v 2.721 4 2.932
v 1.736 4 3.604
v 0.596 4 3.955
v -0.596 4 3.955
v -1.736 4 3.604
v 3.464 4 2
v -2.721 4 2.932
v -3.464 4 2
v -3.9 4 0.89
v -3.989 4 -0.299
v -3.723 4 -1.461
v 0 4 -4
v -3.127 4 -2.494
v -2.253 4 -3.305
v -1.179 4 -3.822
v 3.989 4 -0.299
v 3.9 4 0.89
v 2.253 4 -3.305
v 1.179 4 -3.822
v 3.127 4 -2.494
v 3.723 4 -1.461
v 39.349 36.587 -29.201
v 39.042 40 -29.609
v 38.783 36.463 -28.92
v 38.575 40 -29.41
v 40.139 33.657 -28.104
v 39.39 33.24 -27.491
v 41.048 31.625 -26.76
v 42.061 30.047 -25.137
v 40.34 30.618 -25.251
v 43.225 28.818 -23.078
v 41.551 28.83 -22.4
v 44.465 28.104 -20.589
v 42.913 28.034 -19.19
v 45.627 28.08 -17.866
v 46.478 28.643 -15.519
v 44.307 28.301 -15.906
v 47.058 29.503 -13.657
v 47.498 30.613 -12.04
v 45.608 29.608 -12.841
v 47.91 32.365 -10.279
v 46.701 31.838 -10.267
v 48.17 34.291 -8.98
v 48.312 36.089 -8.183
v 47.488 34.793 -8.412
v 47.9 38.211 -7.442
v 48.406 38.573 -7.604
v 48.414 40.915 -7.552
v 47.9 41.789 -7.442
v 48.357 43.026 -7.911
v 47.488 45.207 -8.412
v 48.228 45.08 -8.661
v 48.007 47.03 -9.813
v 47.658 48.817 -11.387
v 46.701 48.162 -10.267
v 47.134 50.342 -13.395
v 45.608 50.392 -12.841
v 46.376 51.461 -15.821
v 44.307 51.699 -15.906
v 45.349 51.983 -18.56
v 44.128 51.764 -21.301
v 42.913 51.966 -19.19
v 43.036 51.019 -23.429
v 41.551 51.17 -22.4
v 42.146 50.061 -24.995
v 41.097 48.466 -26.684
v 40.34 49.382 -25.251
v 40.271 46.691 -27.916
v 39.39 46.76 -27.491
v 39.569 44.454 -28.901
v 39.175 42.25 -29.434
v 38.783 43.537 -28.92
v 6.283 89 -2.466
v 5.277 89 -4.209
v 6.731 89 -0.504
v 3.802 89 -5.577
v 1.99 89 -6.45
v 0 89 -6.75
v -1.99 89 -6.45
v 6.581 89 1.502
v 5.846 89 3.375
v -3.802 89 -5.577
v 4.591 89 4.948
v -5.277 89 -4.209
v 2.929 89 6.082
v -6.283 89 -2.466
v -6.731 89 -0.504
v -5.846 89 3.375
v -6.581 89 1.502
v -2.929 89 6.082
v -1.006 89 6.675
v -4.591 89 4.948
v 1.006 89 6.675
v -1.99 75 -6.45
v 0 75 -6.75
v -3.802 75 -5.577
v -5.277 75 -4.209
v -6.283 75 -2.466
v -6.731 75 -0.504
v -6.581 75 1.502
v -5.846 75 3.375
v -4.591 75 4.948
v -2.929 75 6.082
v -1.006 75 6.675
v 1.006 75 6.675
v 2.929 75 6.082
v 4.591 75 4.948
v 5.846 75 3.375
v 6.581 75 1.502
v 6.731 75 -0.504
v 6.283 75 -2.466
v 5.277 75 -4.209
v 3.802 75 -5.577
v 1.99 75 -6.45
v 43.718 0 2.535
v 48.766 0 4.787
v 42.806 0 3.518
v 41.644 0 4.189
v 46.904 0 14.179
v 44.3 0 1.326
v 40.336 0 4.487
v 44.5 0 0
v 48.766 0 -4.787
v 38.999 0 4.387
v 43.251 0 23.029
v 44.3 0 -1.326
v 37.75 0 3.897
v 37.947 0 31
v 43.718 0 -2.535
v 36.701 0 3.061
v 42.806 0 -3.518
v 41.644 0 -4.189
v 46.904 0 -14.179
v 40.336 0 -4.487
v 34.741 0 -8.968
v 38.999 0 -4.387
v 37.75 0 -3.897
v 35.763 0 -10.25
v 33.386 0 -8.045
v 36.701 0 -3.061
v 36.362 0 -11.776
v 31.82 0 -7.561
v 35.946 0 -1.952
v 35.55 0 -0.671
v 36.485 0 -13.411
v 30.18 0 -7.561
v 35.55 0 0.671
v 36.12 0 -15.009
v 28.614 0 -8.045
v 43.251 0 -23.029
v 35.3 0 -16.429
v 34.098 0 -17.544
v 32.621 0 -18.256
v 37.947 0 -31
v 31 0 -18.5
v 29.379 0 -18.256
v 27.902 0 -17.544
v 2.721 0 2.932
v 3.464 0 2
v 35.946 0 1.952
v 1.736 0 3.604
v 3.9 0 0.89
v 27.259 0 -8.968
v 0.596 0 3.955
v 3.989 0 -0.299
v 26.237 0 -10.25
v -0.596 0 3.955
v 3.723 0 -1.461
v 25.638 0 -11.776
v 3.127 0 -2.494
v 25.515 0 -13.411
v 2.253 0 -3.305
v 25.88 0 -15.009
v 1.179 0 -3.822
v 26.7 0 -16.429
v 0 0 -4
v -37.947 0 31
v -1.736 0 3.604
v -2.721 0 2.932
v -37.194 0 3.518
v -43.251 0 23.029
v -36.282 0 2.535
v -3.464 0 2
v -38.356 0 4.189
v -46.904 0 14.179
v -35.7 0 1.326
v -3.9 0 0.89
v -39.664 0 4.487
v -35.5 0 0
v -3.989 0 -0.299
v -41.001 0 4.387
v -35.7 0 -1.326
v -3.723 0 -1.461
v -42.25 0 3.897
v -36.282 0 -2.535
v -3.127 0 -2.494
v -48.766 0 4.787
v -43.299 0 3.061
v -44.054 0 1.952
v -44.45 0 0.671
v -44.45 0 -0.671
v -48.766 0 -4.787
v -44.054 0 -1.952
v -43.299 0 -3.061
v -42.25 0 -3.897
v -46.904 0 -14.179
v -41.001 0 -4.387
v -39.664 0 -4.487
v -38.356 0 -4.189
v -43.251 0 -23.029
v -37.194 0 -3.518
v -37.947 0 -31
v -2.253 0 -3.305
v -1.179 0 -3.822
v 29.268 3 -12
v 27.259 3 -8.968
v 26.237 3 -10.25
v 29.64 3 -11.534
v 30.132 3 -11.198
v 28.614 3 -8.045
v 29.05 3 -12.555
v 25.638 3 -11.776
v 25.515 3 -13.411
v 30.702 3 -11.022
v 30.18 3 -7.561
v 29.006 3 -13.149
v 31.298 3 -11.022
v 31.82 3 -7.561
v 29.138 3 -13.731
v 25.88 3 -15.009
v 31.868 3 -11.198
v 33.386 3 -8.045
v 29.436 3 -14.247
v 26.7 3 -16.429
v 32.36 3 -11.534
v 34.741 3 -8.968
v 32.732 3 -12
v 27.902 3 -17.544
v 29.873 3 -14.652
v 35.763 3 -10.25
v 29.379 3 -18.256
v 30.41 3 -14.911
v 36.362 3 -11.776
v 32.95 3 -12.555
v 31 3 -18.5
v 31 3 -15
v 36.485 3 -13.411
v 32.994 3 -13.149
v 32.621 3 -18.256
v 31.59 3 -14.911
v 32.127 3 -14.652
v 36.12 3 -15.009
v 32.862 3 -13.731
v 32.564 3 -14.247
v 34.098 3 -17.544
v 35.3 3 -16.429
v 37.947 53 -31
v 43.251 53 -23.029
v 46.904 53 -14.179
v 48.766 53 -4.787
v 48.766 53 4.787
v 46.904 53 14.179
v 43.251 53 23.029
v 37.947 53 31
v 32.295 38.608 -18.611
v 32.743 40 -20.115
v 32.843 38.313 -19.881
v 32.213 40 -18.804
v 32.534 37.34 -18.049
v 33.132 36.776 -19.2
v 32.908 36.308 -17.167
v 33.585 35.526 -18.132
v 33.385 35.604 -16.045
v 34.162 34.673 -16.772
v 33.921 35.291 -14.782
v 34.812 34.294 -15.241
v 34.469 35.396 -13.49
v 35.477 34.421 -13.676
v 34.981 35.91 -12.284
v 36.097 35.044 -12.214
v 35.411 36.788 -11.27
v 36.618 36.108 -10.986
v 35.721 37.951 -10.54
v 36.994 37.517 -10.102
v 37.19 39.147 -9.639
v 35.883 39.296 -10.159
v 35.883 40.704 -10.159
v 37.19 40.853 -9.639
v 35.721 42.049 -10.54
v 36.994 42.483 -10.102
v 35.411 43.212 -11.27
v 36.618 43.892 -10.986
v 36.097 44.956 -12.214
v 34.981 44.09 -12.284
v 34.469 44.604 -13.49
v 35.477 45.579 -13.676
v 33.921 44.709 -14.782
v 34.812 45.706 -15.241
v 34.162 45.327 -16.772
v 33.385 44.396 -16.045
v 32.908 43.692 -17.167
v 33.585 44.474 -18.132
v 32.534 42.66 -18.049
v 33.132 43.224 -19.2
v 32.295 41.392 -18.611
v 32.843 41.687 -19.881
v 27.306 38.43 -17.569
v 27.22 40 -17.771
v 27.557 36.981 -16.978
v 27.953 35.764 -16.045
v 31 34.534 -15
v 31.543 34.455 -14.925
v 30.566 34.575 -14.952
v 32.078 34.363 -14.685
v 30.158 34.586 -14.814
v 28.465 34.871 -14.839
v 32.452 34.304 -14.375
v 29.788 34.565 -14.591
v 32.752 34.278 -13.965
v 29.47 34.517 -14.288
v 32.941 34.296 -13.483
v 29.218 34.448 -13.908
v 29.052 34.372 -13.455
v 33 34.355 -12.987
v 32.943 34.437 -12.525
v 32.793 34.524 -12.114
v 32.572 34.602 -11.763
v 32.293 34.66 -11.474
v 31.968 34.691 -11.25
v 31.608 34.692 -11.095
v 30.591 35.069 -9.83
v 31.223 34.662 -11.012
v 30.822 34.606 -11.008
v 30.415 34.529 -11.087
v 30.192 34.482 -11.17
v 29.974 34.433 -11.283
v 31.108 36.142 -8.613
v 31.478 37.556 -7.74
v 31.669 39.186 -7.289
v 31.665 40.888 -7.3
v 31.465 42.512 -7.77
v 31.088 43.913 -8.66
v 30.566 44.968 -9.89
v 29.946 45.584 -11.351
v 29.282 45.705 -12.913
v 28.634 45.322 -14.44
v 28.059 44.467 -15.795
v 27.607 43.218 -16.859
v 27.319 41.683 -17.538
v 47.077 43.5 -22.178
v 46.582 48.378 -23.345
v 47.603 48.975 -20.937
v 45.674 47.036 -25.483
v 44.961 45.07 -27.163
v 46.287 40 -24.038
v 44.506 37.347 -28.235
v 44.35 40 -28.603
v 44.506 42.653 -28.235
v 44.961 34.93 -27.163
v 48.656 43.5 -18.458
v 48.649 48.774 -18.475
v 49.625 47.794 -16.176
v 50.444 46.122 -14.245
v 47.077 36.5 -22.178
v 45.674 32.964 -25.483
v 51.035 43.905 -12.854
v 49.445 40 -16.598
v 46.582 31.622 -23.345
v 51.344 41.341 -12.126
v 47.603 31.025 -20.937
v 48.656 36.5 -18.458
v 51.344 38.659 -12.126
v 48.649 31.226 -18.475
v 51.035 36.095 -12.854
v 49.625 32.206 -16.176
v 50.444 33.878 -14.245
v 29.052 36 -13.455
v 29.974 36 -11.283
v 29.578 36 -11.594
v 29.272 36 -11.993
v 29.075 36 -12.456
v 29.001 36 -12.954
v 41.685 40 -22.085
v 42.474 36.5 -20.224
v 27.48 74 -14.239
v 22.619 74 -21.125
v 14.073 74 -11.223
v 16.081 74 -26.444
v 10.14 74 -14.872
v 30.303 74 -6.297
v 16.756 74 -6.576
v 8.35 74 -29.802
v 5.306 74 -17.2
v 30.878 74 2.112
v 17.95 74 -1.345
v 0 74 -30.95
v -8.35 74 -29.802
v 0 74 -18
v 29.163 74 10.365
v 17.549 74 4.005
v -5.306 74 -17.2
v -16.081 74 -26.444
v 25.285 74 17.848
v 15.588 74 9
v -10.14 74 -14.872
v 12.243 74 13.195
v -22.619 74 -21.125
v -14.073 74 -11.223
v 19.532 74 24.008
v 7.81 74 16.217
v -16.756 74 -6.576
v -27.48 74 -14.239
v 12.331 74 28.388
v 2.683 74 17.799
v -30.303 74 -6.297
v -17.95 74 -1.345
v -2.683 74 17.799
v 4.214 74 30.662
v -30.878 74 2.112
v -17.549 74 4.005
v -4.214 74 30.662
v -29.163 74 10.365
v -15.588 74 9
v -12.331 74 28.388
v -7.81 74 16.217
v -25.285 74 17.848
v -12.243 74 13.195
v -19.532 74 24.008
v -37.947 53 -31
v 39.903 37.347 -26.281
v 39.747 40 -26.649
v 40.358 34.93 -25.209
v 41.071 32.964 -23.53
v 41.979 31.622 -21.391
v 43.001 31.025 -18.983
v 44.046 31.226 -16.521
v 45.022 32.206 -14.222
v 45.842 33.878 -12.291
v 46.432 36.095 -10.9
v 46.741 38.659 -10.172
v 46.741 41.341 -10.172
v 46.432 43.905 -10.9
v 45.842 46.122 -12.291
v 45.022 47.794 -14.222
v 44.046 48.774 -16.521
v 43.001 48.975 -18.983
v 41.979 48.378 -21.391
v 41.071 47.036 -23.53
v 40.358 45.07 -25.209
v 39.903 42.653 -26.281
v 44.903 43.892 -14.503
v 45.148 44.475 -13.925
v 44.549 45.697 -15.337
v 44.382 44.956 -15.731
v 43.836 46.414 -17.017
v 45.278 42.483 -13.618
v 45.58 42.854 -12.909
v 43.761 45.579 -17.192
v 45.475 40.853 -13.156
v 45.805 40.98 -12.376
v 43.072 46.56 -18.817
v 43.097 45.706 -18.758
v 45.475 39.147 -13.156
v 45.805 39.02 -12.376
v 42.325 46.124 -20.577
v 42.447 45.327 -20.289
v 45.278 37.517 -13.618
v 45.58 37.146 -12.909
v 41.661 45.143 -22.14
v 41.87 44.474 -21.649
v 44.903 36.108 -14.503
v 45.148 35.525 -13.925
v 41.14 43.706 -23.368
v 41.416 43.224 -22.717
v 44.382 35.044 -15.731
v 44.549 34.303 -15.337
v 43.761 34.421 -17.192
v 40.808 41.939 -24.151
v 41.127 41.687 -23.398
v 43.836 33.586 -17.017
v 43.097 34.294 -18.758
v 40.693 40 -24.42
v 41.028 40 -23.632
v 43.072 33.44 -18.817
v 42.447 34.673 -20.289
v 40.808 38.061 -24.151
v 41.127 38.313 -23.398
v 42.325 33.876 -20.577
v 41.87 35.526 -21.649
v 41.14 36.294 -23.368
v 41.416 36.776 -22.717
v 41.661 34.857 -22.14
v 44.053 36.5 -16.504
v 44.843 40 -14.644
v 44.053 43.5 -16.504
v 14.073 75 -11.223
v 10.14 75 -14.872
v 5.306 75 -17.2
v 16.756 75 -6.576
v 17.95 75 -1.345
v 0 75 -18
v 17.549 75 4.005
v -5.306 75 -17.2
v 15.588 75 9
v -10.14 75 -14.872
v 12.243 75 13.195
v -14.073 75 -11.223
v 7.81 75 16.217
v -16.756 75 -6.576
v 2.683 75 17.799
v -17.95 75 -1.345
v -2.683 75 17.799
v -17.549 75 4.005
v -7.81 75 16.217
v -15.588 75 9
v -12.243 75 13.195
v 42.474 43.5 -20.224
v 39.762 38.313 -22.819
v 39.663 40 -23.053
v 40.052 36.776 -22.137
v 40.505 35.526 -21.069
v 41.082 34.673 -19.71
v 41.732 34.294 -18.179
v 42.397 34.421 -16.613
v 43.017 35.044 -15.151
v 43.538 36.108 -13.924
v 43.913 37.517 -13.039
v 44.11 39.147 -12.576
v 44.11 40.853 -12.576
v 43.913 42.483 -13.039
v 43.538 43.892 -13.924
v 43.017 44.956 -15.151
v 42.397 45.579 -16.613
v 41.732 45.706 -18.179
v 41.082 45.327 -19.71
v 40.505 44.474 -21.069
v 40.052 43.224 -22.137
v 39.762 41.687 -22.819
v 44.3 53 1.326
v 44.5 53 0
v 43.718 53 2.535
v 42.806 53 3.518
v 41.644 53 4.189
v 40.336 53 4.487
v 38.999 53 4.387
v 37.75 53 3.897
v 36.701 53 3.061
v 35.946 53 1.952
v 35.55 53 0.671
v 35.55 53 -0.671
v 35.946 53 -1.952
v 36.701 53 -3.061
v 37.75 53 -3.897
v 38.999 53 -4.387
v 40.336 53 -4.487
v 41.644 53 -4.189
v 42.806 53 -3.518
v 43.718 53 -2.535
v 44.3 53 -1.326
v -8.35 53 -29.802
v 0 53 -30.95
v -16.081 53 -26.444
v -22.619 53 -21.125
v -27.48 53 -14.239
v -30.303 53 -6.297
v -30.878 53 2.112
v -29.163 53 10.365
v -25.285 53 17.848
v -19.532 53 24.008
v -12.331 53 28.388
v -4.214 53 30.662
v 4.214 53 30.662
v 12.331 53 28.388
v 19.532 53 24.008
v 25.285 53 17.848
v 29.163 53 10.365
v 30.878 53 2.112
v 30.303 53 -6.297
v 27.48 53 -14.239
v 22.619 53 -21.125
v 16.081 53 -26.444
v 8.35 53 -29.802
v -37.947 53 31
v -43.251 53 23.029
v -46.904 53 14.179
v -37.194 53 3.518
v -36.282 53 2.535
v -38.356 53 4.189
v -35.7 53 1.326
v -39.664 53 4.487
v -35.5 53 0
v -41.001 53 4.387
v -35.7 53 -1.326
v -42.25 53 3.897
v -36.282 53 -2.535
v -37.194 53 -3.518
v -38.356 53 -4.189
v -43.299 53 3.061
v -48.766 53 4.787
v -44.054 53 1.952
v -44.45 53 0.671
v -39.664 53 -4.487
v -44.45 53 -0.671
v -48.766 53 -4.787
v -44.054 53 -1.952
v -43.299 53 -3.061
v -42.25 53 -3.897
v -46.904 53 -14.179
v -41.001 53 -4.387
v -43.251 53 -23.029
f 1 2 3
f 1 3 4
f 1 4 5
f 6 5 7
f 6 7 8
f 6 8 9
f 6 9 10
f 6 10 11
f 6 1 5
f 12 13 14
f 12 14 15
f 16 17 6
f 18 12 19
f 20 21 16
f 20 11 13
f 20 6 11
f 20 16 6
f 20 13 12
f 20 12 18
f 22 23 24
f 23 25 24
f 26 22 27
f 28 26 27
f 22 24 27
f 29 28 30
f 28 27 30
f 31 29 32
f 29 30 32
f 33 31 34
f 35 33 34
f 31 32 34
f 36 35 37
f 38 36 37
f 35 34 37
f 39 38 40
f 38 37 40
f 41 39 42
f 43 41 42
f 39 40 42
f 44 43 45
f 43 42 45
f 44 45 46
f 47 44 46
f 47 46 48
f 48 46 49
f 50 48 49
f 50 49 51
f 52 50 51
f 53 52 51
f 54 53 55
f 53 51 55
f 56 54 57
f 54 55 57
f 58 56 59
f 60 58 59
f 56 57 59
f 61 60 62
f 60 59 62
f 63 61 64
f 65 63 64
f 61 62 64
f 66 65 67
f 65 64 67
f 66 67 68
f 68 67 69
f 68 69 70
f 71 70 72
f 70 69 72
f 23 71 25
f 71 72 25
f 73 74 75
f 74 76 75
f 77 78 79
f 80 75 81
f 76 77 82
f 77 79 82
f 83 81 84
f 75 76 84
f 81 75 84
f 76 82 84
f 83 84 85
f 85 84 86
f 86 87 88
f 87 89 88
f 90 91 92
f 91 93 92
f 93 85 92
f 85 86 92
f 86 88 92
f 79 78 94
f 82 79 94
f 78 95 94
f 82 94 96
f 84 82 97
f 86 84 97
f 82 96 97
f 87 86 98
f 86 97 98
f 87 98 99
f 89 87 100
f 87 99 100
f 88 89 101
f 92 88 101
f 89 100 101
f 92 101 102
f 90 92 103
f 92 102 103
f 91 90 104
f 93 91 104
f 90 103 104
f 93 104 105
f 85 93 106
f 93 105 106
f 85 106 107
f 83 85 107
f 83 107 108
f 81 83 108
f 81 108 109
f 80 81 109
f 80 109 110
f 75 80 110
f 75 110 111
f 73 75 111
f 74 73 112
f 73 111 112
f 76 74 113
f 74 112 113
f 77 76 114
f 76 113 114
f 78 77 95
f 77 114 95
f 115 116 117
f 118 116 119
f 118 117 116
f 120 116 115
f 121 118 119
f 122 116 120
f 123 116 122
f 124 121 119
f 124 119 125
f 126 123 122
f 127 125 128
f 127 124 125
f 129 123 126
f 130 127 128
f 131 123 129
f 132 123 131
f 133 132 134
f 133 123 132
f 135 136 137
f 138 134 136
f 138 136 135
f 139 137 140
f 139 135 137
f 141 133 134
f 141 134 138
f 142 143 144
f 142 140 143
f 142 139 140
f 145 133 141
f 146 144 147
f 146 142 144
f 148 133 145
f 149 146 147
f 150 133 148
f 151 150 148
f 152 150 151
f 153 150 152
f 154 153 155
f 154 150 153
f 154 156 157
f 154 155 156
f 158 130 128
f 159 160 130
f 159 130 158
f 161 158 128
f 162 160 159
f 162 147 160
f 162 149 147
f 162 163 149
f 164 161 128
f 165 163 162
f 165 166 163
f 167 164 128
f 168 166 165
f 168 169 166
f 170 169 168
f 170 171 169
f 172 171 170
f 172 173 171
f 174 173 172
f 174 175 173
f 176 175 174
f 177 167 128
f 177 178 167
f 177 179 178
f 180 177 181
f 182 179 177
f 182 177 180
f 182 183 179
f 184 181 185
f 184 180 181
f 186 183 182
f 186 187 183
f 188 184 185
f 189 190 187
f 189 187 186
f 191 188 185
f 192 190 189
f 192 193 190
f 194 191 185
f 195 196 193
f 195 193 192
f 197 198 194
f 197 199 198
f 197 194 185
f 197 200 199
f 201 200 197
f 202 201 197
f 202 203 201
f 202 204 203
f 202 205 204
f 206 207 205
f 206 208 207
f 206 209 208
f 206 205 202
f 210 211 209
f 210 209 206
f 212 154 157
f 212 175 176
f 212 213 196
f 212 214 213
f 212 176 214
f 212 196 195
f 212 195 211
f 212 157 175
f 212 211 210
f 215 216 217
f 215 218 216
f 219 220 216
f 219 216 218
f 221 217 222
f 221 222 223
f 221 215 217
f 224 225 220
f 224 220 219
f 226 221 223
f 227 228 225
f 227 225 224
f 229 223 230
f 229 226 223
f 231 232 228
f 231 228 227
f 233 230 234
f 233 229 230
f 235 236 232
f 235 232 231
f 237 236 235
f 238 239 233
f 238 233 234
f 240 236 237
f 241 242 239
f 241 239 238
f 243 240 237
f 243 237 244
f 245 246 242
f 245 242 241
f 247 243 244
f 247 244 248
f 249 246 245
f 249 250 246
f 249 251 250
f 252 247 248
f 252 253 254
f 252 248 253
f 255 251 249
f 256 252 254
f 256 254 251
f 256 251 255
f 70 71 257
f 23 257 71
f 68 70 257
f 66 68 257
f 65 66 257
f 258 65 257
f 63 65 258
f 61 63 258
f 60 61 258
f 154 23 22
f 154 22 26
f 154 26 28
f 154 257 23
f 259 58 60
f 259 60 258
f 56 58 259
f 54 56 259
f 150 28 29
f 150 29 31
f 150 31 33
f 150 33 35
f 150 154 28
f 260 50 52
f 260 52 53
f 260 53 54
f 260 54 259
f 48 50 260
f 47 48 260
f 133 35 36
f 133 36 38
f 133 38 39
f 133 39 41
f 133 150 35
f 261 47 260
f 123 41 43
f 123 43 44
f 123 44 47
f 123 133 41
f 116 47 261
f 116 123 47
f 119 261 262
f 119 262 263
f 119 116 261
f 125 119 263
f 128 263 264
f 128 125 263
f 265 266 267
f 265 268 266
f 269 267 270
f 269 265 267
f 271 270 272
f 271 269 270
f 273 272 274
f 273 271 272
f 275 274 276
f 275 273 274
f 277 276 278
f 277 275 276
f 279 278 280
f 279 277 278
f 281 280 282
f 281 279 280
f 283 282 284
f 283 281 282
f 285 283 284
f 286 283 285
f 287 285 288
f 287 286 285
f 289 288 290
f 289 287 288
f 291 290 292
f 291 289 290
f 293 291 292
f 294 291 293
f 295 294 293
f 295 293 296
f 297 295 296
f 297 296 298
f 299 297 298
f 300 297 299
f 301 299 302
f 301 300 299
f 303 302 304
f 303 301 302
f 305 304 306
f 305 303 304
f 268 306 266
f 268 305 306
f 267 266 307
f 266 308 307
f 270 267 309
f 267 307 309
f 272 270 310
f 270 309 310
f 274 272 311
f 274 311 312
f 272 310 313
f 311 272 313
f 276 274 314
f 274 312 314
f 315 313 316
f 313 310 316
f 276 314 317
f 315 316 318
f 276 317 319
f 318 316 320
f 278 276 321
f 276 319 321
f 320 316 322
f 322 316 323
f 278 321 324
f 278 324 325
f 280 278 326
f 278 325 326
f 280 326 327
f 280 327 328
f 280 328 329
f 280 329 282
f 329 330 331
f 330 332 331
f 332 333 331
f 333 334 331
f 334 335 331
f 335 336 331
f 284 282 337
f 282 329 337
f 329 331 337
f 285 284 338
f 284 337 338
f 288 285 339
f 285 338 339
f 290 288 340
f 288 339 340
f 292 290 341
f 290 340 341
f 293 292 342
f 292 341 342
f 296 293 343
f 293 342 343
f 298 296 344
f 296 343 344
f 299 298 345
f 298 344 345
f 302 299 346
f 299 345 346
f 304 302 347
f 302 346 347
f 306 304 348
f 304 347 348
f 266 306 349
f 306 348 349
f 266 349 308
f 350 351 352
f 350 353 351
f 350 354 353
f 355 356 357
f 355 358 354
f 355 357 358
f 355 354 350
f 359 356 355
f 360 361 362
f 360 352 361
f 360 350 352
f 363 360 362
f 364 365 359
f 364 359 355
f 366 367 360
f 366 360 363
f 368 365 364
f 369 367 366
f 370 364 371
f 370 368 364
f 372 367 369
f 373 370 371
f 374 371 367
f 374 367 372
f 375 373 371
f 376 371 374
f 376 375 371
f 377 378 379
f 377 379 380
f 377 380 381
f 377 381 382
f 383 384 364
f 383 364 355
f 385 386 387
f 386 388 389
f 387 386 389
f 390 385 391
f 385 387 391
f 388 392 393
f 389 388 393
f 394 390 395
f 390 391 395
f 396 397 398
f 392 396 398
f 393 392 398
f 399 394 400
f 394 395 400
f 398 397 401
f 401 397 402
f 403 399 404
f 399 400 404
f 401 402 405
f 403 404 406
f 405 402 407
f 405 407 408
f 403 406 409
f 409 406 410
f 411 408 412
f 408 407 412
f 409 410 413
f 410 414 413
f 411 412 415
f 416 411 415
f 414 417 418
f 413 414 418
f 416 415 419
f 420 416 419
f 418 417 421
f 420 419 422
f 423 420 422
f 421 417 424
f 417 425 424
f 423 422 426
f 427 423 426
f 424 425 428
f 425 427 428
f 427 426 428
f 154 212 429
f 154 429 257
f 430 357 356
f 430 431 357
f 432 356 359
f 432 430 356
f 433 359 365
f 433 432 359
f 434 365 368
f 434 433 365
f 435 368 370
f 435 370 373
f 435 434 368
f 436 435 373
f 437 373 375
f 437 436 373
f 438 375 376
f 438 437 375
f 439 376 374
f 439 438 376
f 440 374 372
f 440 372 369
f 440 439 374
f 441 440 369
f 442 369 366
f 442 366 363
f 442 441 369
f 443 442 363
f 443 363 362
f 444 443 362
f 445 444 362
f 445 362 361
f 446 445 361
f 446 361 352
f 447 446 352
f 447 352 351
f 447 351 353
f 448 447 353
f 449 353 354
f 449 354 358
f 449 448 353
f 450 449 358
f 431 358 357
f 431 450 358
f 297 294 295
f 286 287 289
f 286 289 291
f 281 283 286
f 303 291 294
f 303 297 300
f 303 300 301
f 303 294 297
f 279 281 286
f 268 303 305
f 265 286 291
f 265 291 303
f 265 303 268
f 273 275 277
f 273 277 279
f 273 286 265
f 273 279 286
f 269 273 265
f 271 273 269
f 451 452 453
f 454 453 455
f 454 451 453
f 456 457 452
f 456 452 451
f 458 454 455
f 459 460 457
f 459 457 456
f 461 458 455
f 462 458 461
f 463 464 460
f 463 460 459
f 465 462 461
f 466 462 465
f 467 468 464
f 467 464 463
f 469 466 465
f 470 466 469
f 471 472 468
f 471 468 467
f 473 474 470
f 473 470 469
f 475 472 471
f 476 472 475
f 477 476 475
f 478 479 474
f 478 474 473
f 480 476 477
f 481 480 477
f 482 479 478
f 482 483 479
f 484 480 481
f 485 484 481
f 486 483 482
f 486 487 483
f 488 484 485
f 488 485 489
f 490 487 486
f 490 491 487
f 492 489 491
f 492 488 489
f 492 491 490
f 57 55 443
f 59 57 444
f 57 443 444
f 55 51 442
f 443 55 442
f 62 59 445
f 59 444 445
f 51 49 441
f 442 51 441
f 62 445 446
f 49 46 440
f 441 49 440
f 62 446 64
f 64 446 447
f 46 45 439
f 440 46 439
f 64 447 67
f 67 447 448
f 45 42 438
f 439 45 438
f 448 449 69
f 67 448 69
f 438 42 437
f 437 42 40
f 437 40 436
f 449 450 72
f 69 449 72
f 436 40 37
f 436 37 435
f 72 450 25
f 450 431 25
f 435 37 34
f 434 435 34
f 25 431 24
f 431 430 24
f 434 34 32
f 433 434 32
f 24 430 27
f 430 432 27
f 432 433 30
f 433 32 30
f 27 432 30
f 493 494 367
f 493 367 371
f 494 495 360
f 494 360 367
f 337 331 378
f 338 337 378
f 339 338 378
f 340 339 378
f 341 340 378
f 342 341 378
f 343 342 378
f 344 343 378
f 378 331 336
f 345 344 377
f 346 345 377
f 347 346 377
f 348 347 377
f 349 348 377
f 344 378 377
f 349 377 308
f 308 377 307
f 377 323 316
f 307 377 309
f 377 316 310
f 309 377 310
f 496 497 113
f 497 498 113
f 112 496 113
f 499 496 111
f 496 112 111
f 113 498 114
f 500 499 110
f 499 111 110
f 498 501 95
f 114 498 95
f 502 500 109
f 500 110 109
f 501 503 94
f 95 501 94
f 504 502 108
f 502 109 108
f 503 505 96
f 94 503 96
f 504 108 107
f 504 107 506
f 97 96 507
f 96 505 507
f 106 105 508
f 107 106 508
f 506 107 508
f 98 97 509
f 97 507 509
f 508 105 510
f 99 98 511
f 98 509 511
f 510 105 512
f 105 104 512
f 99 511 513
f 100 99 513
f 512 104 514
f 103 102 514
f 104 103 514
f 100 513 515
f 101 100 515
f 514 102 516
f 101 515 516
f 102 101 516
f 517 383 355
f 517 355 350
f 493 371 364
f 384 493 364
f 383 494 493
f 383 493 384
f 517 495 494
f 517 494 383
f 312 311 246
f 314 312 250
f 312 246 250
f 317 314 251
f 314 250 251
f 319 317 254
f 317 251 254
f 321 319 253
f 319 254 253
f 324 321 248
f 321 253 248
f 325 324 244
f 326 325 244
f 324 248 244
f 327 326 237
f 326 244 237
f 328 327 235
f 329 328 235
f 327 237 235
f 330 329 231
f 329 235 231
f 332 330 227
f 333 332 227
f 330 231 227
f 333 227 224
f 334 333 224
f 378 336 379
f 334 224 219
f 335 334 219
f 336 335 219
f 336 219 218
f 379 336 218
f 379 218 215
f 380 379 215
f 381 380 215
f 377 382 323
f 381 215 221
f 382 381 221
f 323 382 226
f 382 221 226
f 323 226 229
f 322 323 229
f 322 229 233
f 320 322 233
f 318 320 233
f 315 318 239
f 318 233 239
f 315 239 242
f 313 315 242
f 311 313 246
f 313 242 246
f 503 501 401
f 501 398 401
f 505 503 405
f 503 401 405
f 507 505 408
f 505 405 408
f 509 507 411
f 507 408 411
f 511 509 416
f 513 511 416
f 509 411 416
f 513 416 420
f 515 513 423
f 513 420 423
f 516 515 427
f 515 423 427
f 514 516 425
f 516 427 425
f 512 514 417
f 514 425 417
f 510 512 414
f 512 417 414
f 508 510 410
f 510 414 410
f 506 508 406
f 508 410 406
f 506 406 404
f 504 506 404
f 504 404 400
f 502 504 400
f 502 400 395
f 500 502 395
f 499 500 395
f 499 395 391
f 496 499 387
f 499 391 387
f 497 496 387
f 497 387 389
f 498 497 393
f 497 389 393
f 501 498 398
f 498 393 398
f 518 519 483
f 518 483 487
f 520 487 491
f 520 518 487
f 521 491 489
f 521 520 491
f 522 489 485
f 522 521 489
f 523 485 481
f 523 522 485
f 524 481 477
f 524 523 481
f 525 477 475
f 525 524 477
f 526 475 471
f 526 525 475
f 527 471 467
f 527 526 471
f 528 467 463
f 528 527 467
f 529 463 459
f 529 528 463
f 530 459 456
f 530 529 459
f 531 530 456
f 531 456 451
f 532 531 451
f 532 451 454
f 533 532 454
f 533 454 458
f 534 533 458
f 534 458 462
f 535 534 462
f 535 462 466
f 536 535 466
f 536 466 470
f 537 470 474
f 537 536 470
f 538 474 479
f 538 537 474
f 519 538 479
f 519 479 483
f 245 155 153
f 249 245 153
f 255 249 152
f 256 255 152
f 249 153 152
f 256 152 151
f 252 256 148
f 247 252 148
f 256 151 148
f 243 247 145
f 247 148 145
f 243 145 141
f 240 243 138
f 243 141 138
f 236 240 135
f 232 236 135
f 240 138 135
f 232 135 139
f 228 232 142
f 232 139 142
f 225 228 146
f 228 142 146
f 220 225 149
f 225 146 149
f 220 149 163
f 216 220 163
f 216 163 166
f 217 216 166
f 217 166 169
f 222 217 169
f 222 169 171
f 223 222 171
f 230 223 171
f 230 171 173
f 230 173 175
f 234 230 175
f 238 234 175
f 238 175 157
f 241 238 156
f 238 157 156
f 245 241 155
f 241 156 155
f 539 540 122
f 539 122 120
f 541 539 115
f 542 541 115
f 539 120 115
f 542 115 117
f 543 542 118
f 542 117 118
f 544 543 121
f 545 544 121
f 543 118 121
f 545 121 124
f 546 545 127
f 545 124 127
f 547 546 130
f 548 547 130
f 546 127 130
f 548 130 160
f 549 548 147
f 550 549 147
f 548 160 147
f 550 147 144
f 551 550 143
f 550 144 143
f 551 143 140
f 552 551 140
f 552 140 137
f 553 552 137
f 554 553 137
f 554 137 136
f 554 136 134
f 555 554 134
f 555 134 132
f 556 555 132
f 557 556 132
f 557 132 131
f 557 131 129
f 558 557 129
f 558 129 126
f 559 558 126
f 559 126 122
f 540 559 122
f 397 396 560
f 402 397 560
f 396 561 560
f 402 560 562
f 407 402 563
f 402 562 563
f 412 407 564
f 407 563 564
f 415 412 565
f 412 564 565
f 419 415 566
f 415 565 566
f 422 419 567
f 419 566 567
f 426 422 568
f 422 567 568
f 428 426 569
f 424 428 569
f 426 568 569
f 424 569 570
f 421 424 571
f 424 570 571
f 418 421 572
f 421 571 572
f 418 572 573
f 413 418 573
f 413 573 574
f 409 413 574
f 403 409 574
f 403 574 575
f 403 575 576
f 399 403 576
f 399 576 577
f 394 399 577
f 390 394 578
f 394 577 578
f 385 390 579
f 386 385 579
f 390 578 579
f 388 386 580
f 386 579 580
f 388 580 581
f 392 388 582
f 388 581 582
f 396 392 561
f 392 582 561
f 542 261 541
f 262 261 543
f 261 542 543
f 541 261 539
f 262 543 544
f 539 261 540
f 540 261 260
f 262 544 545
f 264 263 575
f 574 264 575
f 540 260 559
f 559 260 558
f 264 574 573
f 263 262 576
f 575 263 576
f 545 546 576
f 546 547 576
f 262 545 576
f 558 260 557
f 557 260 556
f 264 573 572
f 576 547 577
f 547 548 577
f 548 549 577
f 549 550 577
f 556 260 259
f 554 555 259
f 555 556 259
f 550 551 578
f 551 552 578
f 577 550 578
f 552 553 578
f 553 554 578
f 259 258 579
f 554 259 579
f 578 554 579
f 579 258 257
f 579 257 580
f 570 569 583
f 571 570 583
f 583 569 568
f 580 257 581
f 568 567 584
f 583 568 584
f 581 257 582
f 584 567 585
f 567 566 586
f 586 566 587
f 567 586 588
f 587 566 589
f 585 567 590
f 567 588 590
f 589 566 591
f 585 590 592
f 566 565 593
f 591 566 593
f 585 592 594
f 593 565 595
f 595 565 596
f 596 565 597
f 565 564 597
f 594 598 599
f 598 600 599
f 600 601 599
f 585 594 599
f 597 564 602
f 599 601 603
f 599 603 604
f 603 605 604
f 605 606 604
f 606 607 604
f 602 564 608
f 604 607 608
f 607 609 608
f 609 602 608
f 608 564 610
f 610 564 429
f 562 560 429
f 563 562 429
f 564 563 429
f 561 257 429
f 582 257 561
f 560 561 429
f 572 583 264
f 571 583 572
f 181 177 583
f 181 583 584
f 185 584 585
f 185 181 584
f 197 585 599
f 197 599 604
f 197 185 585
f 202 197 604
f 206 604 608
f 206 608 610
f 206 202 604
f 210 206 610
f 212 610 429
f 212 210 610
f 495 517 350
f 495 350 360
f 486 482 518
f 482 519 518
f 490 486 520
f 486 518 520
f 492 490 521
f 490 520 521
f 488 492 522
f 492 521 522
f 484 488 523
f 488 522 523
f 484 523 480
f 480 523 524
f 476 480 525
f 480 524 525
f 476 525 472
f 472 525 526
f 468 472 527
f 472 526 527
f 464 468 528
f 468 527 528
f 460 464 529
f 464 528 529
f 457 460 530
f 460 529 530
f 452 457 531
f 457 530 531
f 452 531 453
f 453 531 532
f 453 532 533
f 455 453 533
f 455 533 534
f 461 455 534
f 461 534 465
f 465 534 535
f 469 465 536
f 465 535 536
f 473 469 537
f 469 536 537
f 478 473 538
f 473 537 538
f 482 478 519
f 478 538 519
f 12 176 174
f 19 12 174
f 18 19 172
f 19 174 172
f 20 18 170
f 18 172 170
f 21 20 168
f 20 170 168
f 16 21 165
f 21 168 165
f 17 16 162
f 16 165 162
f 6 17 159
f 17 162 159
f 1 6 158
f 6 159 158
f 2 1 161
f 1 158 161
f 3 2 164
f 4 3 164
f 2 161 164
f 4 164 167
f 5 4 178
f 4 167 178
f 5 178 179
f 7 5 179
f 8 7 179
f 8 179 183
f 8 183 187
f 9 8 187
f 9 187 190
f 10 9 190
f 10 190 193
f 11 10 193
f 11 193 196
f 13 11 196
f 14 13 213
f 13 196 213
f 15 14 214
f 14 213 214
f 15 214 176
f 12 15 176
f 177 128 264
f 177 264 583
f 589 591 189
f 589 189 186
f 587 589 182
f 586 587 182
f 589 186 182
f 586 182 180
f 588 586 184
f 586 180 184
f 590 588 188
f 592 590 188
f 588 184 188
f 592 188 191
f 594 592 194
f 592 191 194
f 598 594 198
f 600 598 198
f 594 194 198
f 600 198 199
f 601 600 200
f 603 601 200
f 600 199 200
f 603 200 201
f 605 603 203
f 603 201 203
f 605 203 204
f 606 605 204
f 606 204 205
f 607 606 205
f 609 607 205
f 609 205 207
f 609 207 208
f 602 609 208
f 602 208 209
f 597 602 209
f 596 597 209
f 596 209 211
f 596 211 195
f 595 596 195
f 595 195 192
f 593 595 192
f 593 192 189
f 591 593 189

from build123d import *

# Parameters (mm, degrees)
EXTRUDE1_DEPTH     = 53
HOLE1_D            = 9
HOLE1_DEPTH        = 53
SKETCH5_R          = 4
CUT_EXTRUDE1_DEPTH = 4
SKETCH6_R          = 5.5
CUT_EXTRUDE2_DEPTH = 3
SKETCH7_R          = 2
CUT_EXTRUDE3_DEPTH = 33
CUT_EXTRUDE4_DEPTH = 5


with BuildPart() as part:
    # Sketch1 → Extrude1 (new body)
    with BuildSketch(Plane(origin=(0, 0, 0), x_dir=(1, 0, 0), z_dir=(0, 1, 0))):
        with BuildLine():
            Line((-37.947331922, 31), (37.947331922, 31))
            ThreePointArc((37.947331922, 31), (49, 0), (37.947331922, -31))
            Line((37.947331922, -31), (-37.947331922, -31))
            ThreePointArc((-37.947331922, -31), (-49, 0), (-37.947331922, 31))
        make_face()
    extrude(amount=EXTRUDE1_DEPTH)

    # Sketch2 → Revolve1 (revolve)
    with BuildSketch(Plane.XY, mode=Mode.PRIVATE) as revolve1_sk:
        Polygon((0, 89), (-6.75, 89), (-6.75, 75), (-18, 75), (-18, 74), (-30.95, 74), (-30.95, 53), (0, 53), align=None)
    revolve(revolve1_sk.sketch.rotate(Axis((0, 0, 0), (0, 1, 0)), 270), axis=Axis((0, 0, 0), (0, 1, 0)))  # turned: the seam where the file's is

    # Hole1
    with Locations(Plane(origin=(0, 53, 0), x_dir=(-1, 0, 0), z_dir=(0, 1, 0))):
        with Locations((40, 0), (-40, 0)):
            Hole(HOLE1_D / 2, depth=HOLE1_DEPTH)

    # Sketch5 → Cut-Extrude1 (cut)
    with BuildSketch(Plane.XZ):
        with Locations(Location((0, 0, 0), (0, 0, 270))):  # turned: the seam where the file's is
            Circle(SKETCH5_R)
    extrude(amount=-CUT_EXTRUDE1_DEPTH, mode=Mode.SUBTRACT)

    # Sketch6 → Cut-Extrude2 (cut)
    with BuildSketch(Plane.XZ):
        with Locations(Location((31, -13, 0), (0, 0, 270))):  # turned: the seam where the file's is
            Circle(SKETCH6_R)
    extrude(amount=-CUT_EXTRUDE2_DEPTH, mode=Mode.SUBTRACT)

    # Sketch7 → Cut-Extrude3 (cut)
    with BuildSketch(Plane.XZ.offset(-3)):
        with Locations(Location((31, -13, 0), (0, 0, 270))):  # turned: the seam where the file's is
            Circle(SKETCH7_R)
    extrude(amount=-CUT_EXTRUDE3_DEPTH, mode=Mode.SUBTRACT)

    # Sketch8 → Cut-Revolve1 (revolve, cut)
    with BuildSketch(Plane(origin=(0, 0, 0), x_dir=(0.920504853, 0, -0.390731128), z_dir=(0.390731128, 0, 0.920504853)), mode=Mode.PRIVATE) as cut_revolve1_sk:
        Polygon((49, 28), (47, 28), (47, 33.4215), (45.517364509, 34.2775), (32, 34.2775), (32, 40), (49, 40), align=None)
    revolve(cut_revolve1_sk.sketch.rotate(Axis((47.484793311, 40, -20.156098913), (-0.920504853, 0, 0.390731128)), 270), axis=Axis((47.484793311, 40, -20.156098913), (-0.920504853, 0, 0.390731128)), mode=Mode.SUBTRACT)  # turned: the seam where the file's is

    # Sketch9 → Revolve2 (revolve)
    with BuildSketch(Plane(origin=(0, 0, 0), x_dir=(0.920504853, 0, -0.390731128), z_dir=(0.390731128, 0, 0.920504853)), mode=Mode.PRIVATE) as revolve2_sk:
        Polygon((47, 31), (47, 34.2775), (38, 34.2775), (37, 35.2775), (37, 40), (52, 40), (52, 31), align=None)
    revolve(revolve2_sk.sketch.rotate(Axis((53.930450878, 40, -22.892118224), (-0.920504853, 0, 0.390731128)), 270), axis=Axis((53.930450878, 40, -22.892118224), (-0.920504853, 0, 0.390731128)))  # turned: the seam where the file's is

    # Sketch10 → Cut-Extrude4 (cut)
    with BuildSketch(Plane(origin=(47.86625238, 0, -20.318018681), x_dir=(-0.390731128, 0, -0.920504853), z_dir=(0.920504853, 0, -0.390731128))):
        Polygon((4.041451884, 40), (2.020725942, 43.5), (-2.020725942, 43.5), (-4.041451884, 40), (-2.020725942, 36.5), (2.020725942, 36.5), align=None)
    extrude(amount=-CUT_EXTRUDE4_DEPTH, mode=Mode.SUBTRACT)


solid = part.part
